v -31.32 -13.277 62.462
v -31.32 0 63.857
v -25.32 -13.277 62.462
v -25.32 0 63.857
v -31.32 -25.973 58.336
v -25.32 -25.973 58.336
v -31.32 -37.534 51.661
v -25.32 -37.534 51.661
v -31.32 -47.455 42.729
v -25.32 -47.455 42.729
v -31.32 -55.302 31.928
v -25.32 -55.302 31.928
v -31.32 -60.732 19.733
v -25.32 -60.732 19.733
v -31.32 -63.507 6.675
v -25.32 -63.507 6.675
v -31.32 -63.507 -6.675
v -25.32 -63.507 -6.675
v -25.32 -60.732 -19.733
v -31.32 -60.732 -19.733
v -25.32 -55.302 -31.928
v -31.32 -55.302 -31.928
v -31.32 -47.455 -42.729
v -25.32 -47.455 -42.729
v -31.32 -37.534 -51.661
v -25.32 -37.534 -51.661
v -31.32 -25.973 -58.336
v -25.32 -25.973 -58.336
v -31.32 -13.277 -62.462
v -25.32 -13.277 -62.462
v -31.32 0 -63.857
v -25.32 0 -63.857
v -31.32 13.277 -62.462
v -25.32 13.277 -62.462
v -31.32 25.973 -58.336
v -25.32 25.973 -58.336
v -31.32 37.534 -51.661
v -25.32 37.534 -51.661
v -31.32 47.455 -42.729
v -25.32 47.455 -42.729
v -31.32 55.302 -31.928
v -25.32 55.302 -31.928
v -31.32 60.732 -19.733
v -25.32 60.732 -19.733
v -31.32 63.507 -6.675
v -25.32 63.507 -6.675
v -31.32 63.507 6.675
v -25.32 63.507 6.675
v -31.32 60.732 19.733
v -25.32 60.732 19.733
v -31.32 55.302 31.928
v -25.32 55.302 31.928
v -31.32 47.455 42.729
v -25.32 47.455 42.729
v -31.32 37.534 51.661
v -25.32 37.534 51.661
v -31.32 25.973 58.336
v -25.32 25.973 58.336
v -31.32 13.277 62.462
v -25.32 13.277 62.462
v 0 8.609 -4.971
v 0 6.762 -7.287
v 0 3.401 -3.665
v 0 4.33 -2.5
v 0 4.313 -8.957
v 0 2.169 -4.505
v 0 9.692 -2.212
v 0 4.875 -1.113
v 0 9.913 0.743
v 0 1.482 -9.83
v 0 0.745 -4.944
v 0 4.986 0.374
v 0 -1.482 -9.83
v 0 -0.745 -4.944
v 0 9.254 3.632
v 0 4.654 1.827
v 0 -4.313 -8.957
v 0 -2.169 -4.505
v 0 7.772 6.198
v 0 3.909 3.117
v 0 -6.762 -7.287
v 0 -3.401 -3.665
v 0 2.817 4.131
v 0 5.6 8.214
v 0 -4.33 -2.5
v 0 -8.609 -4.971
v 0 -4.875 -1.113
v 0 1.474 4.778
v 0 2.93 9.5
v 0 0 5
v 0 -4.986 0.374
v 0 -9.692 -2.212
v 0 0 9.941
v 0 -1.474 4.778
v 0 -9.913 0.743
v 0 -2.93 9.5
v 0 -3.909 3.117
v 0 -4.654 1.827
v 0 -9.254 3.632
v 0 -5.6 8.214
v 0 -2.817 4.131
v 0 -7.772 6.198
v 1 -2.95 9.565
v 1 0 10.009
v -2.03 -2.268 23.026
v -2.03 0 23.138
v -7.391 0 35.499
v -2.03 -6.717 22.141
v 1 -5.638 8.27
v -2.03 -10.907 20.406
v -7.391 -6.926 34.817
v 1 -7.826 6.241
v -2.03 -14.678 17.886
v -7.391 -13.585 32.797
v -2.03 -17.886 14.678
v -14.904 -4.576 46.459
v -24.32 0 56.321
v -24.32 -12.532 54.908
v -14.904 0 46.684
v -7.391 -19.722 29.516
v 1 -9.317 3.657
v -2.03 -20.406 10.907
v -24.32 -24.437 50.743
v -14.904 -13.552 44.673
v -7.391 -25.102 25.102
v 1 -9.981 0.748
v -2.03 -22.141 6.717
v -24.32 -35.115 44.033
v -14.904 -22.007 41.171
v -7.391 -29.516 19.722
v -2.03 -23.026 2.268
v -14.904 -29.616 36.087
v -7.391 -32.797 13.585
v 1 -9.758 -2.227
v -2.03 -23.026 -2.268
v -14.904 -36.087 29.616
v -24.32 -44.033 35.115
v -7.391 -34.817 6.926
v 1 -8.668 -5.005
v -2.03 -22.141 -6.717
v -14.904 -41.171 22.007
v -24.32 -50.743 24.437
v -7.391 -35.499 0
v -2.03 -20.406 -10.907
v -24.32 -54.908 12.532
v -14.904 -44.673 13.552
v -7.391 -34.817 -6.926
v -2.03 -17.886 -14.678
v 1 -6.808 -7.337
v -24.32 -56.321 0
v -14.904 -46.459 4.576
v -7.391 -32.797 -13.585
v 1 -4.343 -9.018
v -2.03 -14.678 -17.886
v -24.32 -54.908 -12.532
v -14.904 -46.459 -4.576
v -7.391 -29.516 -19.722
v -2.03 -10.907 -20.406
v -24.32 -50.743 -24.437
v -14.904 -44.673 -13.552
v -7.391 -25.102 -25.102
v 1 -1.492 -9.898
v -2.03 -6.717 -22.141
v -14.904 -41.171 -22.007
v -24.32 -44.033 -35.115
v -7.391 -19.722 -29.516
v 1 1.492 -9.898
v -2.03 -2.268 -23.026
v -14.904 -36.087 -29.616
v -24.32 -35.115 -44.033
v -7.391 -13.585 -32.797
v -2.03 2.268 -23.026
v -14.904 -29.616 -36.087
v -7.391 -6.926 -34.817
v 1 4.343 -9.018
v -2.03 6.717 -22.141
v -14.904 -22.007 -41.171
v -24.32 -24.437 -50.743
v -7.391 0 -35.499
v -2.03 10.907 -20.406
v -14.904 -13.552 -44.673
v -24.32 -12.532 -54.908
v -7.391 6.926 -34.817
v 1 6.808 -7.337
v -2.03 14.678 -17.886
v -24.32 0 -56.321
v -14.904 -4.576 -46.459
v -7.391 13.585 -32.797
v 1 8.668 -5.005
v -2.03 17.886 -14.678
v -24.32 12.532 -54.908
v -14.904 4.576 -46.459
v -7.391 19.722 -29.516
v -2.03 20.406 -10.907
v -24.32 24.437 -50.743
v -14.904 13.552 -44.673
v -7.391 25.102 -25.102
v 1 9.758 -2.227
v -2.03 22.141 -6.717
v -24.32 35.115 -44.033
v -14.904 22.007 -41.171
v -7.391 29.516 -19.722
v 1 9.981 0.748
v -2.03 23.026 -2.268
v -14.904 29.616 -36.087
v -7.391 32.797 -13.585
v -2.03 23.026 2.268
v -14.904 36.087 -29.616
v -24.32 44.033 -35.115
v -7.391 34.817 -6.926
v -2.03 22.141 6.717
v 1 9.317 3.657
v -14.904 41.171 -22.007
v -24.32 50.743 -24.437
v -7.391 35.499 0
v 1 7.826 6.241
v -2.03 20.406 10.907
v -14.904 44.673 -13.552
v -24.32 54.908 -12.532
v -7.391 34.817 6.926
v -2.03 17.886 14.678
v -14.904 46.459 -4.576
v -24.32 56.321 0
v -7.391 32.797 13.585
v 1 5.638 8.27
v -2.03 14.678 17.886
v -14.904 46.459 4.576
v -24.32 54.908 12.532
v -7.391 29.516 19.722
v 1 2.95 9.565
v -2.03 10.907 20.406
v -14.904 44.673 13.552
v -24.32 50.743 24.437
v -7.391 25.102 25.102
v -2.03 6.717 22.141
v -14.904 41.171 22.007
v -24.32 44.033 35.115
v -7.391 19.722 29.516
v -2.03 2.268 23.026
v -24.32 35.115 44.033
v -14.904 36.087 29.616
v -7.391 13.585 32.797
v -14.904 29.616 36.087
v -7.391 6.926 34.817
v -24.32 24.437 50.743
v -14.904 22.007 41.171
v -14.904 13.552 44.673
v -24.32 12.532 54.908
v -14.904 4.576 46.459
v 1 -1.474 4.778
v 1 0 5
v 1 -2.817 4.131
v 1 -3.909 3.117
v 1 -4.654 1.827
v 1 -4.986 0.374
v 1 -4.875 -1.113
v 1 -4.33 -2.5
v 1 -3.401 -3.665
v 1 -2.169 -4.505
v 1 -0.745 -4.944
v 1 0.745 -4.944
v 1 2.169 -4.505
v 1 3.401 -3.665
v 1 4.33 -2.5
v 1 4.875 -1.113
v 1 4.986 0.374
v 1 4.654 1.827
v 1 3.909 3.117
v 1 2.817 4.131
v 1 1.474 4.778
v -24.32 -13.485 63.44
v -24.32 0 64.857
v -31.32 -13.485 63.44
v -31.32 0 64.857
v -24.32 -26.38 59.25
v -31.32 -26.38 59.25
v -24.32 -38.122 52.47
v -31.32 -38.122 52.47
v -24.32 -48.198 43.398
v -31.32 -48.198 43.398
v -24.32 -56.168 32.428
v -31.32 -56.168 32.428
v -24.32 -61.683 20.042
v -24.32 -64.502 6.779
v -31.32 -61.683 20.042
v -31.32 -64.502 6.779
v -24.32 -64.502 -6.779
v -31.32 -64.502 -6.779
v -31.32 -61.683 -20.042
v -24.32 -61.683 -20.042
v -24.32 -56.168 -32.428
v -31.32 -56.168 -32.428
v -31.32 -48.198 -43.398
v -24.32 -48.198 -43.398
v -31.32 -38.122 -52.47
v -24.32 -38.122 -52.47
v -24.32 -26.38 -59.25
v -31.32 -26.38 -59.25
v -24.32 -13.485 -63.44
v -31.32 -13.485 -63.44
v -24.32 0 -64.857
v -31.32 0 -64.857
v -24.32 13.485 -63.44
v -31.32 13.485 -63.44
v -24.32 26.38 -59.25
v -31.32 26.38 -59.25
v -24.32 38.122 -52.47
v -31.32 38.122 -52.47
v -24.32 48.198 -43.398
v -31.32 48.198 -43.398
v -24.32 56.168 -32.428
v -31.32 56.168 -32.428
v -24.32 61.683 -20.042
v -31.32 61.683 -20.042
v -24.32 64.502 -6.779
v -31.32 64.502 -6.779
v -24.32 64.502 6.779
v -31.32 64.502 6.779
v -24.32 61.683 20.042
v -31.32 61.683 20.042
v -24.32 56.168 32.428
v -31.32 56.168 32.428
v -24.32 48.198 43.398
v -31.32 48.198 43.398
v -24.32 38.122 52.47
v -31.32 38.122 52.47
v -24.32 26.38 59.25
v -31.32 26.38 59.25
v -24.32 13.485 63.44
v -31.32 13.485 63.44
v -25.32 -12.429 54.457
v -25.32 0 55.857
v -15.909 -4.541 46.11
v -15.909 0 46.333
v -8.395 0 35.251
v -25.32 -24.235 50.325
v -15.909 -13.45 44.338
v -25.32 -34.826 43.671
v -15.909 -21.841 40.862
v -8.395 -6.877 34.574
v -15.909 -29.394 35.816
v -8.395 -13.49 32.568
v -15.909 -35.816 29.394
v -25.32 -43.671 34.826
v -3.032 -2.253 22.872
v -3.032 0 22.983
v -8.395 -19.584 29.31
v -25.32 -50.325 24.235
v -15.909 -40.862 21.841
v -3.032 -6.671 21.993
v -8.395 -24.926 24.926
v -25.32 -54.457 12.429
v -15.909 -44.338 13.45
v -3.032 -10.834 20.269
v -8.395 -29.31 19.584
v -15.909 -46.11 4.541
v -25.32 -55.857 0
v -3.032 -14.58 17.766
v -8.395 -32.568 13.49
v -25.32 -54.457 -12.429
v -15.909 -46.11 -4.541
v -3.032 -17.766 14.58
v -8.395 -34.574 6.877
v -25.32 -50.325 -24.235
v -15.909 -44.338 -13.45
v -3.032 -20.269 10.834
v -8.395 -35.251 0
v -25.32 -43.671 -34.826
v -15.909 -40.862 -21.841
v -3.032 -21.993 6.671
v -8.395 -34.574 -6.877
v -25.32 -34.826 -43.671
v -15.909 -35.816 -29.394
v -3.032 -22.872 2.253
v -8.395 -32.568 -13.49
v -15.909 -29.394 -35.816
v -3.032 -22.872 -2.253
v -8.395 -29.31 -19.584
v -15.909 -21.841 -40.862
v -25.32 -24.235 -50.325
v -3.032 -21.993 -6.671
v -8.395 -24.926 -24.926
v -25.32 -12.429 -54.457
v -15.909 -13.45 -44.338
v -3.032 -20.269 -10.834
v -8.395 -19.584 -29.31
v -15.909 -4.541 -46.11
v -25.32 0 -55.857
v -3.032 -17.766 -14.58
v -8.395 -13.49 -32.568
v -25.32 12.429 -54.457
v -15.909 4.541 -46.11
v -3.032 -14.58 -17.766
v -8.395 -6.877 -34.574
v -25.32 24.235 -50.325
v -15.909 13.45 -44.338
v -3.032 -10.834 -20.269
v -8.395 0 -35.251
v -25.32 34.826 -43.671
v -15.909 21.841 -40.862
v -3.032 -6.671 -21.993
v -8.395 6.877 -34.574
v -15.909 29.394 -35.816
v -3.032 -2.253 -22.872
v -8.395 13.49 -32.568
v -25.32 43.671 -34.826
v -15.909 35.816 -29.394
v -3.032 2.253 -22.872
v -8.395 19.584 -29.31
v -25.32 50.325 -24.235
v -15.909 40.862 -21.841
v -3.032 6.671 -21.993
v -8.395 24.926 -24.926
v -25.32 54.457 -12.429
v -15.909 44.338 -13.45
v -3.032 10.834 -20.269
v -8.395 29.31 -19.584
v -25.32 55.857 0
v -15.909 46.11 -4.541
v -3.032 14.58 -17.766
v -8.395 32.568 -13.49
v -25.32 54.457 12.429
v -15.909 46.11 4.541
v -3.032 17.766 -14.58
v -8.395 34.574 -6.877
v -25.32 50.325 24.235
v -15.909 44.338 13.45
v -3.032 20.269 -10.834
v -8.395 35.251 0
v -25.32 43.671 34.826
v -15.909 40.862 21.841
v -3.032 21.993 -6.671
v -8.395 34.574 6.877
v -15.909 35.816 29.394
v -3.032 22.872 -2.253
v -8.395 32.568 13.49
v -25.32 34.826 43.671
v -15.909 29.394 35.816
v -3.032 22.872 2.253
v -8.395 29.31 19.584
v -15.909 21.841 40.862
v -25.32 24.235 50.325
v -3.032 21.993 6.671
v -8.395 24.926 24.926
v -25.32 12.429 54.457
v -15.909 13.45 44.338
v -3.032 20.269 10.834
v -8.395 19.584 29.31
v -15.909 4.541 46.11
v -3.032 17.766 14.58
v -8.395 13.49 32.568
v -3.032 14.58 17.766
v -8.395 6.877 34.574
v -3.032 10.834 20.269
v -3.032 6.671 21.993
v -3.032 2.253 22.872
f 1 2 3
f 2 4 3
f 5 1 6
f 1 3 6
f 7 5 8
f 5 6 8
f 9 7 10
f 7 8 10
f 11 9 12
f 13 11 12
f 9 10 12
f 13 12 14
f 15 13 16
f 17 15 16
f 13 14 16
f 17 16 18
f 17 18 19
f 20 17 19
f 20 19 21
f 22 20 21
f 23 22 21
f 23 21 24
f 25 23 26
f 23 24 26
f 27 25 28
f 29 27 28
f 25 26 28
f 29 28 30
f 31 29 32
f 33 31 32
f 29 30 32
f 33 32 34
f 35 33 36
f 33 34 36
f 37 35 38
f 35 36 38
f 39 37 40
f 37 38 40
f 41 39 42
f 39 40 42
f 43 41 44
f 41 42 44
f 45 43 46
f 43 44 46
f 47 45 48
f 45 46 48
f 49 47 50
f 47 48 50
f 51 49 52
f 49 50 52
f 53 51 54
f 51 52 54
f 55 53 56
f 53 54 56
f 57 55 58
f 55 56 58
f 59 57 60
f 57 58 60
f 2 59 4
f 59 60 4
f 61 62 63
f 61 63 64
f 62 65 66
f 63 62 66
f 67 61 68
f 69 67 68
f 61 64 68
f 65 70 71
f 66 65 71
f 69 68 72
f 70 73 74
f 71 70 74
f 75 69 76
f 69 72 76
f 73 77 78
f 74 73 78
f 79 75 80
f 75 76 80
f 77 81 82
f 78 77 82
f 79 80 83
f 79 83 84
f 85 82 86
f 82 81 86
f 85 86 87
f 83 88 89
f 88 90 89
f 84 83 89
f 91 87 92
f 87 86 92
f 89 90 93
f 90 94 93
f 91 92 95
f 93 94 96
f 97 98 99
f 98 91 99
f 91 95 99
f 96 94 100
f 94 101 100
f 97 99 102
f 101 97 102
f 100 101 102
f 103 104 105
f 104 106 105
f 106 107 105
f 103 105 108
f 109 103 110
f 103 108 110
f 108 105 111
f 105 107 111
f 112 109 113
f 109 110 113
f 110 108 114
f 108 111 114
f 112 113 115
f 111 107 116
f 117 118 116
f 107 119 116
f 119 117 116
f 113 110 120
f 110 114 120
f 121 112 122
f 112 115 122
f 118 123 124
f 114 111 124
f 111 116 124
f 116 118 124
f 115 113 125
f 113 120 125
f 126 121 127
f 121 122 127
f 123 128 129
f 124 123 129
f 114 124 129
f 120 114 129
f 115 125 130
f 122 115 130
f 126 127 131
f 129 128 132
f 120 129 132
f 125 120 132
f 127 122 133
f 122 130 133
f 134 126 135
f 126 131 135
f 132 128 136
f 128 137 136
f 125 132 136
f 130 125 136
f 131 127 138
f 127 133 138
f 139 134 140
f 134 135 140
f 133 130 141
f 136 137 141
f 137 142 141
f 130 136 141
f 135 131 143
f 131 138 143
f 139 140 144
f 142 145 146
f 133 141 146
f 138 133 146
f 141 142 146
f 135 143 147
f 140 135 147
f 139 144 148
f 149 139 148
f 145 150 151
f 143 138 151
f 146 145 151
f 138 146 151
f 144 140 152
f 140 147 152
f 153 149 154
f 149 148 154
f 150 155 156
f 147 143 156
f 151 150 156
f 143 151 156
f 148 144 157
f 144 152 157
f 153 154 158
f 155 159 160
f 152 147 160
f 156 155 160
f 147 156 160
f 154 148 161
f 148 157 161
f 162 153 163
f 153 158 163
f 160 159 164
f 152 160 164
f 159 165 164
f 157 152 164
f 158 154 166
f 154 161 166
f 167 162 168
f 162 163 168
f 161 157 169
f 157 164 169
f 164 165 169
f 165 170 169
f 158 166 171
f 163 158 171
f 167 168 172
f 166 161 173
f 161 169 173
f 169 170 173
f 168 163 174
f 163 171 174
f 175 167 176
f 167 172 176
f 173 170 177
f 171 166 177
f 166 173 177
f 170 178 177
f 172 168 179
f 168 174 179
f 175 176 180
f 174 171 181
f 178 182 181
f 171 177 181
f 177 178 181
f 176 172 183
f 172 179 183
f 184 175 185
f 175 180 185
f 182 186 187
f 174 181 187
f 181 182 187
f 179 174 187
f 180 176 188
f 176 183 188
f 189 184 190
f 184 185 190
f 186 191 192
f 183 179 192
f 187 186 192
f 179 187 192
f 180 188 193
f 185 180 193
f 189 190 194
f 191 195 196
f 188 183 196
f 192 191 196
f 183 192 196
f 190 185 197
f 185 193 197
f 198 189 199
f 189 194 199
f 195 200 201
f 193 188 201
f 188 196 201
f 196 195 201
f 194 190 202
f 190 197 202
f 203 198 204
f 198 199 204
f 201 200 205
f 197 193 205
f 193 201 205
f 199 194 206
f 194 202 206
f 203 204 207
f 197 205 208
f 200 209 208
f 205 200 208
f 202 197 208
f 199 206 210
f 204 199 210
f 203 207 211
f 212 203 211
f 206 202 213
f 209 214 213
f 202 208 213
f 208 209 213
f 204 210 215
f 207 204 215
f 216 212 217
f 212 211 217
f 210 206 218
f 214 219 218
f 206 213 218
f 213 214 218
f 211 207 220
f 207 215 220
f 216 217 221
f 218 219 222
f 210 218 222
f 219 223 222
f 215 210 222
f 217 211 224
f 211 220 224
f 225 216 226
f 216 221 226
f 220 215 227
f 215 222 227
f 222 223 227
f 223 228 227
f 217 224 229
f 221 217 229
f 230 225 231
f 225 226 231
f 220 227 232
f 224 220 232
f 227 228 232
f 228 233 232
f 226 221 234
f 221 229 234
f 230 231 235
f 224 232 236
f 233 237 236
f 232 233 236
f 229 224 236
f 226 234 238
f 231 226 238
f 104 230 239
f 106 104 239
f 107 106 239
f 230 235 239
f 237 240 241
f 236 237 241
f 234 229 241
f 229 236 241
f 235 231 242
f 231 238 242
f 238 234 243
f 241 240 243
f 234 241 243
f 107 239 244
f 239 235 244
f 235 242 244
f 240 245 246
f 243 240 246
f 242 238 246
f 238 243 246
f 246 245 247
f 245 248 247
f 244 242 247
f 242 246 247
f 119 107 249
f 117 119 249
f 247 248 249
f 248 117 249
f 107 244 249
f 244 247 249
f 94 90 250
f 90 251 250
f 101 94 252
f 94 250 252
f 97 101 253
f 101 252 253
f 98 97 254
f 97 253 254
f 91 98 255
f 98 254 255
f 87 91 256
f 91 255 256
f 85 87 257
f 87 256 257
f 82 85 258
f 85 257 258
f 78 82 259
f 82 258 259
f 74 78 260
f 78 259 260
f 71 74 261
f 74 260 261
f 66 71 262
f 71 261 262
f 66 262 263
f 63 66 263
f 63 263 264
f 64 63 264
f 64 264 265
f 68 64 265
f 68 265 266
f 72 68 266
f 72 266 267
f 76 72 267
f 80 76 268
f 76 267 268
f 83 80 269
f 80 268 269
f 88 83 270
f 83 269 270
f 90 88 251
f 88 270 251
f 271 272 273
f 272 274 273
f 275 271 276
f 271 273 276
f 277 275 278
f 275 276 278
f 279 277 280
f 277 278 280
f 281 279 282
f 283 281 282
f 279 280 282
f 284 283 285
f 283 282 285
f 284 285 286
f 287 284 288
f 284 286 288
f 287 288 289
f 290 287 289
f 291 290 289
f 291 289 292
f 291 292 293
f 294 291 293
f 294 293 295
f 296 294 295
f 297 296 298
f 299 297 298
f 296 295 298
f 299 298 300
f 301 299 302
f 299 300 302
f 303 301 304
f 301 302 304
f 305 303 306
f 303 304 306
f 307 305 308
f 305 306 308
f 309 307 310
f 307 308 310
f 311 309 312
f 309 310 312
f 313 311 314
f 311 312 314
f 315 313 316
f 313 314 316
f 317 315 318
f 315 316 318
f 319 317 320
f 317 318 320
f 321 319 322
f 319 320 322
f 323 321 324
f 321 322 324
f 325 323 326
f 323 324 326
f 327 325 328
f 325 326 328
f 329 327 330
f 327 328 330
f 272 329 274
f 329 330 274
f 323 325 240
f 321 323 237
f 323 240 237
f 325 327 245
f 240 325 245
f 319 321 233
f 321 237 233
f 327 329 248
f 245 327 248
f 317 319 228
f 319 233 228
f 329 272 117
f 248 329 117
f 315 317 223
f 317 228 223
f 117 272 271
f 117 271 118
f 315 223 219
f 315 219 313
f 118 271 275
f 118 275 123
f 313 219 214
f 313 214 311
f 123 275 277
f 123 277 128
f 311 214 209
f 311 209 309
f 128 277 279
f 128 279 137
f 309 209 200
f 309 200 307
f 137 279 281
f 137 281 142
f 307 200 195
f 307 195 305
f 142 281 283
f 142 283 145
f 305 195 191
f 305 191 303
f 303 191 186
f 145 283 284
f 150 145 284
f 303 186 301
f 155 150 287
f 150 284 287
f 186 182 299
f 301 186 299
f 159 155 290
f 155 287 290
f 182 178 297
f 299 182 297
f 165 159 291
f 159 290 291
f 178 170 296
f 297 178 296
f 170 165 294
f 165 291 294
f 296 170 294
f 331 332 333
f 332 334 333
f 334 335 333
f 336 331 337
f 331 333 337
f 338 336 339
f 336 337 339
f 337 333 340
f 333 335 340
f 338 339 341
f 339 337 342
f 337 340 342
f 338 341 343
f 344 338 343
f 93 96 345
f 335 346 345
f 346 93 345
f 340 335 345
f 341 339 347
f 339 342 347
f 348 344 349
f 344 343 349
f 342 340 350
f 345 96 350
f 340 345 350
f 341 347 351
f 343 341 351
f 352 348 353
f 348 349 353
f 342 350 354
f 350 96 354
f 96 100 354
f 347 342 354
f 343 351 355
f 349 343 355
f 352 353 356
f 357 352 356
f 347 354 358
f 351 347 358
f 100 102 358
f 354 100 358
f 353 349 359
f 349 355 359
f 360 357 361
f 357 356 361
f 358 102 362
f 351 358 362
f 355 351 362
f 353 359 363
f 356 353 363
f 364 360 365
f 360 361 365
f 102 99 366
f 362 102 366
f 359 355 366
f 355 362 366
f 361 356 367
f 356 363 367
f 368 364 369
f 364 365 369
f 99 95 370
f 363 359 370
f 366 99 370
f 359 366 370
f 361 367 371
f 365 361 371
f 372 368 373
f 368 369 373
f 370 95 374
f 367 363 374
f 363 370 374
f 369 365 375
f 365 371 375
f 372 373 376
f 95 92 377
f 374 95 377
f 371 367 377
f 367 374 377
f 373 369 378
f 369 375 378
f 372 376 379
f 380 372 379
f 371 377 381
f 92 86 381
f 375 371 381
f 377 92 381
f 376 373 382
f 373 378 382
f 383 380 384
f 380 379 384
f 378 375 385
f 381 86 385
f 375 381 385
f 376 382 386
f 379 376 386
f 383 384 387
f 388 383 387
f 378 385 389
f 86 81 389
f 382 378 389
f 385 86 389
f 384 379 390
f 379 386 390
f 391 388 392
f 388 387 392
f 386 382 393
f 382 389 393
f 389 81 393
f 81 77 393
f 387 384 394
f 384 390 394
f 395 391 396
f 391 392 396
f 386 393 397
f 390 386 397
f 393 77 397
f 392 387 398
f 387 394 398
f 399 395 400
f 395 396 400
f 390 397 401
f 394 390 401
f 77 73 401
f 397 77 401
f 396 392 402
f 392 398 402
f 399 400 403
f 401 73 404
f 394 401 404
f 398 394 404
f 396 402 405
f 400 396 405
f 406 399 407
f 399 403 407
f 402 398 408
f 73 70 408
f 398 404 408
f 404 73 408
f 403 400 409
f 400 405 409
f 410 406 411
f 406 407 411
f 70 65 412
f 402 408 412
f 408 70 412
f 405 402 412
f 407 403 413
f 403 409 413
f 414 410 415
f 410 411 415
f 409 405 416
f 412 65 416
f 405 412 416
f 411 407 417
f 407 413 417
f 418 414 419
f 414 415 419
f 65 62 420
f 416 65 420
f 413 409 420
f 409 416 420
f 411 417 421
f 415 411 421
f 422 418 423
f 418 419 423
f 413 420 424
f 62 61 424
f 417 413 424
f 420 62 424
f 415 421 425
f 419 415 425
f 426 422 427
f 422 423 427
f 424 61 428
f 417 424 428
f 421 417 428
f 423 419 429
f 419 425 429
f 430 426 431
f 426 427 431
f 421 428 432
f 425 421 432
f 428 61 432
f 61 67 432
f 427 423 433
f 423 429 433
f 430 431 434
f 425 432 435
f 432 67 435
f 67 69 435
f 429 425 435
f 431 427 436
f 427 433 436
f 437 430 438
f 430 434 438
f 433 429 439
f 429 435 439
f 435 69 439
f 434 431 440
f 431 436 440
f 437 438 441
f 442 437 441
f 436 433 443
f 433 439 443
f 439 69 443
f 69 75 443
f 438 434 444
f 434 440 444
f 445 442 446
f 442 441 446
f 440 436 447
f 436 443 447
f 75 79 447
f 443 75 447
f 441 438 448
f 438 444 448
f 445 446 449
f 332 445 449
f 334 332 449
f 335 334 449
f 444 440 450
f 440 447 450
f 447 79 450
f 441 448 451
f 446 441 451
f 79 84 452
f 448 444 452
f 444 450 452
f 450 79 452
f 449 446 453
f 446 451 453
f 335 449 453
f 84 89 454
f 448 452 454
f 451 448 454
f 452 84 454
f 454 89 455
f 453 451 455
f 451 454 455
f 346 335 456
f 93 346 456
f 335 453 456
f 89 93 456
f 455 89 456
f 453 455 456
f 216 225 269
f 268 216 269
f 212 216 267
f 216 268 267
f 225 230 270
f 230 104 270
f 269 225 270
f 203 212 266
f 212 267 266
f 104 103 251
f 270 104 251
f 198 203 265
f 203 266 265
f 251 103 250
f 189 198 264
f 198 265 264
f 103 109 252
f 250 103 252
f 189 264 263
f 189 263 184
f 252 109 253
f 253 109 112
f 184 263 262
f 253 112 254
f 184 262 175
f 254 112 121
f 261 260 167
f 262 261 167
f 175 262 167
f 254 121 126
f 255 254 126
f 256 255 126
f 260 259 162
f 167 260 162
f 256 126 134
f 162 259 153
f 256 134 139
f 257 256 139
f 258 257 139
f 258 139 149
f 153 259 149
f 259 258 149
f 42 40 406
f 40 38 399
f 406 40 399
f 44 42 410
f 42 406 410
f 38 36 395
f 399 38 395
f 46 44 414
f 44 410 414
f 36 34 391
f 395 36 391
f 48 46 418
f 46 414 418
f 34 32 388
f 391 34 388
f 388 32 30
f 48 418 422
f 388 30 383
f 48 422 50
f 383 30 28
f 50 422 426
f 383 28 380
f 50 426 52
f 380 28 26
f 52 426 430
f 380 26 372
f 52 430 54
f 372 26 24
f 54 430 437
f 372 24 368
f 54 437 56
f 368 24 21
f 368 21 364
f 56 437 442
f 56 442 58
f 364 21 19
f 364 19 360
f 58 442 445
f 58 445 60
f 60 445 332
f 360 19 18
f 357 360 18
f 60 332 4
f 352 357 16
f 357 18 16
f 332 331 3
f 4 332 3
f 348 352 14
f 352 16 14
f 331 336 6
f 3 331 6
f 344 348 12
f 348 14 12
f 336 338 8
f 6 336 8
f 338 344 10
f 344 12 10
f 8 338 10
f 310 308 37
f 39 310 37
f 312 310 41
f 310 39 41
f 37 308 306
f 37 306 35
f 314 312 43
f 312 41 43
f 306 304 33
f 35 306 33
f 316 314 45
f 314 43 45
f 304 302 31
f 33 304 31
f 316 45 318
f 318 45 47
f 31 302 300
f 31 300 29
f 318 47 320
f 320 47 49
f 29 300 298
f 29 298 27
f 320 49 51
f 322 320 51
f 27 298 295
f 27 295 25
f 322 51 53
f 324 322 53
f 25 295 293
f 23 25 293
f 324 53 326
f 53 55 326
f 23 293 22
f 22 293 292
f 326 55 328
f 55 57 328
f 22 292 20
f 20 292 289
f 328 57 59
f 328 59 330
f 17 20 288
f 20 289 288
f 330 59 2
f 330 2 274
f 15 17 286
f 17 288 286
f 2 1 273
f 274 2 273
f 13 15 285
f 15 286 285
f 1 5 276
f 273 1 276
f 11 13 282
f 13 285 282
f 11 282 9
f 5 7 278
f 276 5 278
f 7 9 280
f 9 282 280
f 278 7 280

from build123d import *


with BuildPart() as part:
    # Szkic1 → Obrót1 (revolve)
    with BuildSketch(Plane.XY, mode=Mode.PRIVATE) as obr_t1_sk:
        with BuildLine():
            Line((-31.319935083, 63.856960175), (-25.319935083, 63.856960175))
            Line((-25.319935083, 63.856960175), (-25.319935083, 55.856960175))
            ThreePointArc((-25.319935083, 55.856960175), (-8.395162691, 35.250864878), (0, 9.941176471))
            Line((0, 9.941176471), (0, 5))
            Line((0, 5), (1, 5))
            Line((1, 5), (1, 10.0093516))
            ThreePointArc((1, 10.0093516), (-7.390646301, 35.49911912), (-24.319935083, 56.320511361))
            Line((-24.319935083, 56.320511361), (-24.319935083, 64.856960175))
            Line((-24.319935083, 64.856960175), (-31.319935083, 64.856960175))
            Line((-31.319935083, 64.856960175), (-31.319935083, 63.856960175))
        make_face()
    revolve(obr_t1_sk.sketch.rotate(Axis((-67.855420072, 0, 0), (1, 0, 0)), 90), axis=Axis((-67.855420072, 0, 0), (1, 0, 0)))


solid = part.part
